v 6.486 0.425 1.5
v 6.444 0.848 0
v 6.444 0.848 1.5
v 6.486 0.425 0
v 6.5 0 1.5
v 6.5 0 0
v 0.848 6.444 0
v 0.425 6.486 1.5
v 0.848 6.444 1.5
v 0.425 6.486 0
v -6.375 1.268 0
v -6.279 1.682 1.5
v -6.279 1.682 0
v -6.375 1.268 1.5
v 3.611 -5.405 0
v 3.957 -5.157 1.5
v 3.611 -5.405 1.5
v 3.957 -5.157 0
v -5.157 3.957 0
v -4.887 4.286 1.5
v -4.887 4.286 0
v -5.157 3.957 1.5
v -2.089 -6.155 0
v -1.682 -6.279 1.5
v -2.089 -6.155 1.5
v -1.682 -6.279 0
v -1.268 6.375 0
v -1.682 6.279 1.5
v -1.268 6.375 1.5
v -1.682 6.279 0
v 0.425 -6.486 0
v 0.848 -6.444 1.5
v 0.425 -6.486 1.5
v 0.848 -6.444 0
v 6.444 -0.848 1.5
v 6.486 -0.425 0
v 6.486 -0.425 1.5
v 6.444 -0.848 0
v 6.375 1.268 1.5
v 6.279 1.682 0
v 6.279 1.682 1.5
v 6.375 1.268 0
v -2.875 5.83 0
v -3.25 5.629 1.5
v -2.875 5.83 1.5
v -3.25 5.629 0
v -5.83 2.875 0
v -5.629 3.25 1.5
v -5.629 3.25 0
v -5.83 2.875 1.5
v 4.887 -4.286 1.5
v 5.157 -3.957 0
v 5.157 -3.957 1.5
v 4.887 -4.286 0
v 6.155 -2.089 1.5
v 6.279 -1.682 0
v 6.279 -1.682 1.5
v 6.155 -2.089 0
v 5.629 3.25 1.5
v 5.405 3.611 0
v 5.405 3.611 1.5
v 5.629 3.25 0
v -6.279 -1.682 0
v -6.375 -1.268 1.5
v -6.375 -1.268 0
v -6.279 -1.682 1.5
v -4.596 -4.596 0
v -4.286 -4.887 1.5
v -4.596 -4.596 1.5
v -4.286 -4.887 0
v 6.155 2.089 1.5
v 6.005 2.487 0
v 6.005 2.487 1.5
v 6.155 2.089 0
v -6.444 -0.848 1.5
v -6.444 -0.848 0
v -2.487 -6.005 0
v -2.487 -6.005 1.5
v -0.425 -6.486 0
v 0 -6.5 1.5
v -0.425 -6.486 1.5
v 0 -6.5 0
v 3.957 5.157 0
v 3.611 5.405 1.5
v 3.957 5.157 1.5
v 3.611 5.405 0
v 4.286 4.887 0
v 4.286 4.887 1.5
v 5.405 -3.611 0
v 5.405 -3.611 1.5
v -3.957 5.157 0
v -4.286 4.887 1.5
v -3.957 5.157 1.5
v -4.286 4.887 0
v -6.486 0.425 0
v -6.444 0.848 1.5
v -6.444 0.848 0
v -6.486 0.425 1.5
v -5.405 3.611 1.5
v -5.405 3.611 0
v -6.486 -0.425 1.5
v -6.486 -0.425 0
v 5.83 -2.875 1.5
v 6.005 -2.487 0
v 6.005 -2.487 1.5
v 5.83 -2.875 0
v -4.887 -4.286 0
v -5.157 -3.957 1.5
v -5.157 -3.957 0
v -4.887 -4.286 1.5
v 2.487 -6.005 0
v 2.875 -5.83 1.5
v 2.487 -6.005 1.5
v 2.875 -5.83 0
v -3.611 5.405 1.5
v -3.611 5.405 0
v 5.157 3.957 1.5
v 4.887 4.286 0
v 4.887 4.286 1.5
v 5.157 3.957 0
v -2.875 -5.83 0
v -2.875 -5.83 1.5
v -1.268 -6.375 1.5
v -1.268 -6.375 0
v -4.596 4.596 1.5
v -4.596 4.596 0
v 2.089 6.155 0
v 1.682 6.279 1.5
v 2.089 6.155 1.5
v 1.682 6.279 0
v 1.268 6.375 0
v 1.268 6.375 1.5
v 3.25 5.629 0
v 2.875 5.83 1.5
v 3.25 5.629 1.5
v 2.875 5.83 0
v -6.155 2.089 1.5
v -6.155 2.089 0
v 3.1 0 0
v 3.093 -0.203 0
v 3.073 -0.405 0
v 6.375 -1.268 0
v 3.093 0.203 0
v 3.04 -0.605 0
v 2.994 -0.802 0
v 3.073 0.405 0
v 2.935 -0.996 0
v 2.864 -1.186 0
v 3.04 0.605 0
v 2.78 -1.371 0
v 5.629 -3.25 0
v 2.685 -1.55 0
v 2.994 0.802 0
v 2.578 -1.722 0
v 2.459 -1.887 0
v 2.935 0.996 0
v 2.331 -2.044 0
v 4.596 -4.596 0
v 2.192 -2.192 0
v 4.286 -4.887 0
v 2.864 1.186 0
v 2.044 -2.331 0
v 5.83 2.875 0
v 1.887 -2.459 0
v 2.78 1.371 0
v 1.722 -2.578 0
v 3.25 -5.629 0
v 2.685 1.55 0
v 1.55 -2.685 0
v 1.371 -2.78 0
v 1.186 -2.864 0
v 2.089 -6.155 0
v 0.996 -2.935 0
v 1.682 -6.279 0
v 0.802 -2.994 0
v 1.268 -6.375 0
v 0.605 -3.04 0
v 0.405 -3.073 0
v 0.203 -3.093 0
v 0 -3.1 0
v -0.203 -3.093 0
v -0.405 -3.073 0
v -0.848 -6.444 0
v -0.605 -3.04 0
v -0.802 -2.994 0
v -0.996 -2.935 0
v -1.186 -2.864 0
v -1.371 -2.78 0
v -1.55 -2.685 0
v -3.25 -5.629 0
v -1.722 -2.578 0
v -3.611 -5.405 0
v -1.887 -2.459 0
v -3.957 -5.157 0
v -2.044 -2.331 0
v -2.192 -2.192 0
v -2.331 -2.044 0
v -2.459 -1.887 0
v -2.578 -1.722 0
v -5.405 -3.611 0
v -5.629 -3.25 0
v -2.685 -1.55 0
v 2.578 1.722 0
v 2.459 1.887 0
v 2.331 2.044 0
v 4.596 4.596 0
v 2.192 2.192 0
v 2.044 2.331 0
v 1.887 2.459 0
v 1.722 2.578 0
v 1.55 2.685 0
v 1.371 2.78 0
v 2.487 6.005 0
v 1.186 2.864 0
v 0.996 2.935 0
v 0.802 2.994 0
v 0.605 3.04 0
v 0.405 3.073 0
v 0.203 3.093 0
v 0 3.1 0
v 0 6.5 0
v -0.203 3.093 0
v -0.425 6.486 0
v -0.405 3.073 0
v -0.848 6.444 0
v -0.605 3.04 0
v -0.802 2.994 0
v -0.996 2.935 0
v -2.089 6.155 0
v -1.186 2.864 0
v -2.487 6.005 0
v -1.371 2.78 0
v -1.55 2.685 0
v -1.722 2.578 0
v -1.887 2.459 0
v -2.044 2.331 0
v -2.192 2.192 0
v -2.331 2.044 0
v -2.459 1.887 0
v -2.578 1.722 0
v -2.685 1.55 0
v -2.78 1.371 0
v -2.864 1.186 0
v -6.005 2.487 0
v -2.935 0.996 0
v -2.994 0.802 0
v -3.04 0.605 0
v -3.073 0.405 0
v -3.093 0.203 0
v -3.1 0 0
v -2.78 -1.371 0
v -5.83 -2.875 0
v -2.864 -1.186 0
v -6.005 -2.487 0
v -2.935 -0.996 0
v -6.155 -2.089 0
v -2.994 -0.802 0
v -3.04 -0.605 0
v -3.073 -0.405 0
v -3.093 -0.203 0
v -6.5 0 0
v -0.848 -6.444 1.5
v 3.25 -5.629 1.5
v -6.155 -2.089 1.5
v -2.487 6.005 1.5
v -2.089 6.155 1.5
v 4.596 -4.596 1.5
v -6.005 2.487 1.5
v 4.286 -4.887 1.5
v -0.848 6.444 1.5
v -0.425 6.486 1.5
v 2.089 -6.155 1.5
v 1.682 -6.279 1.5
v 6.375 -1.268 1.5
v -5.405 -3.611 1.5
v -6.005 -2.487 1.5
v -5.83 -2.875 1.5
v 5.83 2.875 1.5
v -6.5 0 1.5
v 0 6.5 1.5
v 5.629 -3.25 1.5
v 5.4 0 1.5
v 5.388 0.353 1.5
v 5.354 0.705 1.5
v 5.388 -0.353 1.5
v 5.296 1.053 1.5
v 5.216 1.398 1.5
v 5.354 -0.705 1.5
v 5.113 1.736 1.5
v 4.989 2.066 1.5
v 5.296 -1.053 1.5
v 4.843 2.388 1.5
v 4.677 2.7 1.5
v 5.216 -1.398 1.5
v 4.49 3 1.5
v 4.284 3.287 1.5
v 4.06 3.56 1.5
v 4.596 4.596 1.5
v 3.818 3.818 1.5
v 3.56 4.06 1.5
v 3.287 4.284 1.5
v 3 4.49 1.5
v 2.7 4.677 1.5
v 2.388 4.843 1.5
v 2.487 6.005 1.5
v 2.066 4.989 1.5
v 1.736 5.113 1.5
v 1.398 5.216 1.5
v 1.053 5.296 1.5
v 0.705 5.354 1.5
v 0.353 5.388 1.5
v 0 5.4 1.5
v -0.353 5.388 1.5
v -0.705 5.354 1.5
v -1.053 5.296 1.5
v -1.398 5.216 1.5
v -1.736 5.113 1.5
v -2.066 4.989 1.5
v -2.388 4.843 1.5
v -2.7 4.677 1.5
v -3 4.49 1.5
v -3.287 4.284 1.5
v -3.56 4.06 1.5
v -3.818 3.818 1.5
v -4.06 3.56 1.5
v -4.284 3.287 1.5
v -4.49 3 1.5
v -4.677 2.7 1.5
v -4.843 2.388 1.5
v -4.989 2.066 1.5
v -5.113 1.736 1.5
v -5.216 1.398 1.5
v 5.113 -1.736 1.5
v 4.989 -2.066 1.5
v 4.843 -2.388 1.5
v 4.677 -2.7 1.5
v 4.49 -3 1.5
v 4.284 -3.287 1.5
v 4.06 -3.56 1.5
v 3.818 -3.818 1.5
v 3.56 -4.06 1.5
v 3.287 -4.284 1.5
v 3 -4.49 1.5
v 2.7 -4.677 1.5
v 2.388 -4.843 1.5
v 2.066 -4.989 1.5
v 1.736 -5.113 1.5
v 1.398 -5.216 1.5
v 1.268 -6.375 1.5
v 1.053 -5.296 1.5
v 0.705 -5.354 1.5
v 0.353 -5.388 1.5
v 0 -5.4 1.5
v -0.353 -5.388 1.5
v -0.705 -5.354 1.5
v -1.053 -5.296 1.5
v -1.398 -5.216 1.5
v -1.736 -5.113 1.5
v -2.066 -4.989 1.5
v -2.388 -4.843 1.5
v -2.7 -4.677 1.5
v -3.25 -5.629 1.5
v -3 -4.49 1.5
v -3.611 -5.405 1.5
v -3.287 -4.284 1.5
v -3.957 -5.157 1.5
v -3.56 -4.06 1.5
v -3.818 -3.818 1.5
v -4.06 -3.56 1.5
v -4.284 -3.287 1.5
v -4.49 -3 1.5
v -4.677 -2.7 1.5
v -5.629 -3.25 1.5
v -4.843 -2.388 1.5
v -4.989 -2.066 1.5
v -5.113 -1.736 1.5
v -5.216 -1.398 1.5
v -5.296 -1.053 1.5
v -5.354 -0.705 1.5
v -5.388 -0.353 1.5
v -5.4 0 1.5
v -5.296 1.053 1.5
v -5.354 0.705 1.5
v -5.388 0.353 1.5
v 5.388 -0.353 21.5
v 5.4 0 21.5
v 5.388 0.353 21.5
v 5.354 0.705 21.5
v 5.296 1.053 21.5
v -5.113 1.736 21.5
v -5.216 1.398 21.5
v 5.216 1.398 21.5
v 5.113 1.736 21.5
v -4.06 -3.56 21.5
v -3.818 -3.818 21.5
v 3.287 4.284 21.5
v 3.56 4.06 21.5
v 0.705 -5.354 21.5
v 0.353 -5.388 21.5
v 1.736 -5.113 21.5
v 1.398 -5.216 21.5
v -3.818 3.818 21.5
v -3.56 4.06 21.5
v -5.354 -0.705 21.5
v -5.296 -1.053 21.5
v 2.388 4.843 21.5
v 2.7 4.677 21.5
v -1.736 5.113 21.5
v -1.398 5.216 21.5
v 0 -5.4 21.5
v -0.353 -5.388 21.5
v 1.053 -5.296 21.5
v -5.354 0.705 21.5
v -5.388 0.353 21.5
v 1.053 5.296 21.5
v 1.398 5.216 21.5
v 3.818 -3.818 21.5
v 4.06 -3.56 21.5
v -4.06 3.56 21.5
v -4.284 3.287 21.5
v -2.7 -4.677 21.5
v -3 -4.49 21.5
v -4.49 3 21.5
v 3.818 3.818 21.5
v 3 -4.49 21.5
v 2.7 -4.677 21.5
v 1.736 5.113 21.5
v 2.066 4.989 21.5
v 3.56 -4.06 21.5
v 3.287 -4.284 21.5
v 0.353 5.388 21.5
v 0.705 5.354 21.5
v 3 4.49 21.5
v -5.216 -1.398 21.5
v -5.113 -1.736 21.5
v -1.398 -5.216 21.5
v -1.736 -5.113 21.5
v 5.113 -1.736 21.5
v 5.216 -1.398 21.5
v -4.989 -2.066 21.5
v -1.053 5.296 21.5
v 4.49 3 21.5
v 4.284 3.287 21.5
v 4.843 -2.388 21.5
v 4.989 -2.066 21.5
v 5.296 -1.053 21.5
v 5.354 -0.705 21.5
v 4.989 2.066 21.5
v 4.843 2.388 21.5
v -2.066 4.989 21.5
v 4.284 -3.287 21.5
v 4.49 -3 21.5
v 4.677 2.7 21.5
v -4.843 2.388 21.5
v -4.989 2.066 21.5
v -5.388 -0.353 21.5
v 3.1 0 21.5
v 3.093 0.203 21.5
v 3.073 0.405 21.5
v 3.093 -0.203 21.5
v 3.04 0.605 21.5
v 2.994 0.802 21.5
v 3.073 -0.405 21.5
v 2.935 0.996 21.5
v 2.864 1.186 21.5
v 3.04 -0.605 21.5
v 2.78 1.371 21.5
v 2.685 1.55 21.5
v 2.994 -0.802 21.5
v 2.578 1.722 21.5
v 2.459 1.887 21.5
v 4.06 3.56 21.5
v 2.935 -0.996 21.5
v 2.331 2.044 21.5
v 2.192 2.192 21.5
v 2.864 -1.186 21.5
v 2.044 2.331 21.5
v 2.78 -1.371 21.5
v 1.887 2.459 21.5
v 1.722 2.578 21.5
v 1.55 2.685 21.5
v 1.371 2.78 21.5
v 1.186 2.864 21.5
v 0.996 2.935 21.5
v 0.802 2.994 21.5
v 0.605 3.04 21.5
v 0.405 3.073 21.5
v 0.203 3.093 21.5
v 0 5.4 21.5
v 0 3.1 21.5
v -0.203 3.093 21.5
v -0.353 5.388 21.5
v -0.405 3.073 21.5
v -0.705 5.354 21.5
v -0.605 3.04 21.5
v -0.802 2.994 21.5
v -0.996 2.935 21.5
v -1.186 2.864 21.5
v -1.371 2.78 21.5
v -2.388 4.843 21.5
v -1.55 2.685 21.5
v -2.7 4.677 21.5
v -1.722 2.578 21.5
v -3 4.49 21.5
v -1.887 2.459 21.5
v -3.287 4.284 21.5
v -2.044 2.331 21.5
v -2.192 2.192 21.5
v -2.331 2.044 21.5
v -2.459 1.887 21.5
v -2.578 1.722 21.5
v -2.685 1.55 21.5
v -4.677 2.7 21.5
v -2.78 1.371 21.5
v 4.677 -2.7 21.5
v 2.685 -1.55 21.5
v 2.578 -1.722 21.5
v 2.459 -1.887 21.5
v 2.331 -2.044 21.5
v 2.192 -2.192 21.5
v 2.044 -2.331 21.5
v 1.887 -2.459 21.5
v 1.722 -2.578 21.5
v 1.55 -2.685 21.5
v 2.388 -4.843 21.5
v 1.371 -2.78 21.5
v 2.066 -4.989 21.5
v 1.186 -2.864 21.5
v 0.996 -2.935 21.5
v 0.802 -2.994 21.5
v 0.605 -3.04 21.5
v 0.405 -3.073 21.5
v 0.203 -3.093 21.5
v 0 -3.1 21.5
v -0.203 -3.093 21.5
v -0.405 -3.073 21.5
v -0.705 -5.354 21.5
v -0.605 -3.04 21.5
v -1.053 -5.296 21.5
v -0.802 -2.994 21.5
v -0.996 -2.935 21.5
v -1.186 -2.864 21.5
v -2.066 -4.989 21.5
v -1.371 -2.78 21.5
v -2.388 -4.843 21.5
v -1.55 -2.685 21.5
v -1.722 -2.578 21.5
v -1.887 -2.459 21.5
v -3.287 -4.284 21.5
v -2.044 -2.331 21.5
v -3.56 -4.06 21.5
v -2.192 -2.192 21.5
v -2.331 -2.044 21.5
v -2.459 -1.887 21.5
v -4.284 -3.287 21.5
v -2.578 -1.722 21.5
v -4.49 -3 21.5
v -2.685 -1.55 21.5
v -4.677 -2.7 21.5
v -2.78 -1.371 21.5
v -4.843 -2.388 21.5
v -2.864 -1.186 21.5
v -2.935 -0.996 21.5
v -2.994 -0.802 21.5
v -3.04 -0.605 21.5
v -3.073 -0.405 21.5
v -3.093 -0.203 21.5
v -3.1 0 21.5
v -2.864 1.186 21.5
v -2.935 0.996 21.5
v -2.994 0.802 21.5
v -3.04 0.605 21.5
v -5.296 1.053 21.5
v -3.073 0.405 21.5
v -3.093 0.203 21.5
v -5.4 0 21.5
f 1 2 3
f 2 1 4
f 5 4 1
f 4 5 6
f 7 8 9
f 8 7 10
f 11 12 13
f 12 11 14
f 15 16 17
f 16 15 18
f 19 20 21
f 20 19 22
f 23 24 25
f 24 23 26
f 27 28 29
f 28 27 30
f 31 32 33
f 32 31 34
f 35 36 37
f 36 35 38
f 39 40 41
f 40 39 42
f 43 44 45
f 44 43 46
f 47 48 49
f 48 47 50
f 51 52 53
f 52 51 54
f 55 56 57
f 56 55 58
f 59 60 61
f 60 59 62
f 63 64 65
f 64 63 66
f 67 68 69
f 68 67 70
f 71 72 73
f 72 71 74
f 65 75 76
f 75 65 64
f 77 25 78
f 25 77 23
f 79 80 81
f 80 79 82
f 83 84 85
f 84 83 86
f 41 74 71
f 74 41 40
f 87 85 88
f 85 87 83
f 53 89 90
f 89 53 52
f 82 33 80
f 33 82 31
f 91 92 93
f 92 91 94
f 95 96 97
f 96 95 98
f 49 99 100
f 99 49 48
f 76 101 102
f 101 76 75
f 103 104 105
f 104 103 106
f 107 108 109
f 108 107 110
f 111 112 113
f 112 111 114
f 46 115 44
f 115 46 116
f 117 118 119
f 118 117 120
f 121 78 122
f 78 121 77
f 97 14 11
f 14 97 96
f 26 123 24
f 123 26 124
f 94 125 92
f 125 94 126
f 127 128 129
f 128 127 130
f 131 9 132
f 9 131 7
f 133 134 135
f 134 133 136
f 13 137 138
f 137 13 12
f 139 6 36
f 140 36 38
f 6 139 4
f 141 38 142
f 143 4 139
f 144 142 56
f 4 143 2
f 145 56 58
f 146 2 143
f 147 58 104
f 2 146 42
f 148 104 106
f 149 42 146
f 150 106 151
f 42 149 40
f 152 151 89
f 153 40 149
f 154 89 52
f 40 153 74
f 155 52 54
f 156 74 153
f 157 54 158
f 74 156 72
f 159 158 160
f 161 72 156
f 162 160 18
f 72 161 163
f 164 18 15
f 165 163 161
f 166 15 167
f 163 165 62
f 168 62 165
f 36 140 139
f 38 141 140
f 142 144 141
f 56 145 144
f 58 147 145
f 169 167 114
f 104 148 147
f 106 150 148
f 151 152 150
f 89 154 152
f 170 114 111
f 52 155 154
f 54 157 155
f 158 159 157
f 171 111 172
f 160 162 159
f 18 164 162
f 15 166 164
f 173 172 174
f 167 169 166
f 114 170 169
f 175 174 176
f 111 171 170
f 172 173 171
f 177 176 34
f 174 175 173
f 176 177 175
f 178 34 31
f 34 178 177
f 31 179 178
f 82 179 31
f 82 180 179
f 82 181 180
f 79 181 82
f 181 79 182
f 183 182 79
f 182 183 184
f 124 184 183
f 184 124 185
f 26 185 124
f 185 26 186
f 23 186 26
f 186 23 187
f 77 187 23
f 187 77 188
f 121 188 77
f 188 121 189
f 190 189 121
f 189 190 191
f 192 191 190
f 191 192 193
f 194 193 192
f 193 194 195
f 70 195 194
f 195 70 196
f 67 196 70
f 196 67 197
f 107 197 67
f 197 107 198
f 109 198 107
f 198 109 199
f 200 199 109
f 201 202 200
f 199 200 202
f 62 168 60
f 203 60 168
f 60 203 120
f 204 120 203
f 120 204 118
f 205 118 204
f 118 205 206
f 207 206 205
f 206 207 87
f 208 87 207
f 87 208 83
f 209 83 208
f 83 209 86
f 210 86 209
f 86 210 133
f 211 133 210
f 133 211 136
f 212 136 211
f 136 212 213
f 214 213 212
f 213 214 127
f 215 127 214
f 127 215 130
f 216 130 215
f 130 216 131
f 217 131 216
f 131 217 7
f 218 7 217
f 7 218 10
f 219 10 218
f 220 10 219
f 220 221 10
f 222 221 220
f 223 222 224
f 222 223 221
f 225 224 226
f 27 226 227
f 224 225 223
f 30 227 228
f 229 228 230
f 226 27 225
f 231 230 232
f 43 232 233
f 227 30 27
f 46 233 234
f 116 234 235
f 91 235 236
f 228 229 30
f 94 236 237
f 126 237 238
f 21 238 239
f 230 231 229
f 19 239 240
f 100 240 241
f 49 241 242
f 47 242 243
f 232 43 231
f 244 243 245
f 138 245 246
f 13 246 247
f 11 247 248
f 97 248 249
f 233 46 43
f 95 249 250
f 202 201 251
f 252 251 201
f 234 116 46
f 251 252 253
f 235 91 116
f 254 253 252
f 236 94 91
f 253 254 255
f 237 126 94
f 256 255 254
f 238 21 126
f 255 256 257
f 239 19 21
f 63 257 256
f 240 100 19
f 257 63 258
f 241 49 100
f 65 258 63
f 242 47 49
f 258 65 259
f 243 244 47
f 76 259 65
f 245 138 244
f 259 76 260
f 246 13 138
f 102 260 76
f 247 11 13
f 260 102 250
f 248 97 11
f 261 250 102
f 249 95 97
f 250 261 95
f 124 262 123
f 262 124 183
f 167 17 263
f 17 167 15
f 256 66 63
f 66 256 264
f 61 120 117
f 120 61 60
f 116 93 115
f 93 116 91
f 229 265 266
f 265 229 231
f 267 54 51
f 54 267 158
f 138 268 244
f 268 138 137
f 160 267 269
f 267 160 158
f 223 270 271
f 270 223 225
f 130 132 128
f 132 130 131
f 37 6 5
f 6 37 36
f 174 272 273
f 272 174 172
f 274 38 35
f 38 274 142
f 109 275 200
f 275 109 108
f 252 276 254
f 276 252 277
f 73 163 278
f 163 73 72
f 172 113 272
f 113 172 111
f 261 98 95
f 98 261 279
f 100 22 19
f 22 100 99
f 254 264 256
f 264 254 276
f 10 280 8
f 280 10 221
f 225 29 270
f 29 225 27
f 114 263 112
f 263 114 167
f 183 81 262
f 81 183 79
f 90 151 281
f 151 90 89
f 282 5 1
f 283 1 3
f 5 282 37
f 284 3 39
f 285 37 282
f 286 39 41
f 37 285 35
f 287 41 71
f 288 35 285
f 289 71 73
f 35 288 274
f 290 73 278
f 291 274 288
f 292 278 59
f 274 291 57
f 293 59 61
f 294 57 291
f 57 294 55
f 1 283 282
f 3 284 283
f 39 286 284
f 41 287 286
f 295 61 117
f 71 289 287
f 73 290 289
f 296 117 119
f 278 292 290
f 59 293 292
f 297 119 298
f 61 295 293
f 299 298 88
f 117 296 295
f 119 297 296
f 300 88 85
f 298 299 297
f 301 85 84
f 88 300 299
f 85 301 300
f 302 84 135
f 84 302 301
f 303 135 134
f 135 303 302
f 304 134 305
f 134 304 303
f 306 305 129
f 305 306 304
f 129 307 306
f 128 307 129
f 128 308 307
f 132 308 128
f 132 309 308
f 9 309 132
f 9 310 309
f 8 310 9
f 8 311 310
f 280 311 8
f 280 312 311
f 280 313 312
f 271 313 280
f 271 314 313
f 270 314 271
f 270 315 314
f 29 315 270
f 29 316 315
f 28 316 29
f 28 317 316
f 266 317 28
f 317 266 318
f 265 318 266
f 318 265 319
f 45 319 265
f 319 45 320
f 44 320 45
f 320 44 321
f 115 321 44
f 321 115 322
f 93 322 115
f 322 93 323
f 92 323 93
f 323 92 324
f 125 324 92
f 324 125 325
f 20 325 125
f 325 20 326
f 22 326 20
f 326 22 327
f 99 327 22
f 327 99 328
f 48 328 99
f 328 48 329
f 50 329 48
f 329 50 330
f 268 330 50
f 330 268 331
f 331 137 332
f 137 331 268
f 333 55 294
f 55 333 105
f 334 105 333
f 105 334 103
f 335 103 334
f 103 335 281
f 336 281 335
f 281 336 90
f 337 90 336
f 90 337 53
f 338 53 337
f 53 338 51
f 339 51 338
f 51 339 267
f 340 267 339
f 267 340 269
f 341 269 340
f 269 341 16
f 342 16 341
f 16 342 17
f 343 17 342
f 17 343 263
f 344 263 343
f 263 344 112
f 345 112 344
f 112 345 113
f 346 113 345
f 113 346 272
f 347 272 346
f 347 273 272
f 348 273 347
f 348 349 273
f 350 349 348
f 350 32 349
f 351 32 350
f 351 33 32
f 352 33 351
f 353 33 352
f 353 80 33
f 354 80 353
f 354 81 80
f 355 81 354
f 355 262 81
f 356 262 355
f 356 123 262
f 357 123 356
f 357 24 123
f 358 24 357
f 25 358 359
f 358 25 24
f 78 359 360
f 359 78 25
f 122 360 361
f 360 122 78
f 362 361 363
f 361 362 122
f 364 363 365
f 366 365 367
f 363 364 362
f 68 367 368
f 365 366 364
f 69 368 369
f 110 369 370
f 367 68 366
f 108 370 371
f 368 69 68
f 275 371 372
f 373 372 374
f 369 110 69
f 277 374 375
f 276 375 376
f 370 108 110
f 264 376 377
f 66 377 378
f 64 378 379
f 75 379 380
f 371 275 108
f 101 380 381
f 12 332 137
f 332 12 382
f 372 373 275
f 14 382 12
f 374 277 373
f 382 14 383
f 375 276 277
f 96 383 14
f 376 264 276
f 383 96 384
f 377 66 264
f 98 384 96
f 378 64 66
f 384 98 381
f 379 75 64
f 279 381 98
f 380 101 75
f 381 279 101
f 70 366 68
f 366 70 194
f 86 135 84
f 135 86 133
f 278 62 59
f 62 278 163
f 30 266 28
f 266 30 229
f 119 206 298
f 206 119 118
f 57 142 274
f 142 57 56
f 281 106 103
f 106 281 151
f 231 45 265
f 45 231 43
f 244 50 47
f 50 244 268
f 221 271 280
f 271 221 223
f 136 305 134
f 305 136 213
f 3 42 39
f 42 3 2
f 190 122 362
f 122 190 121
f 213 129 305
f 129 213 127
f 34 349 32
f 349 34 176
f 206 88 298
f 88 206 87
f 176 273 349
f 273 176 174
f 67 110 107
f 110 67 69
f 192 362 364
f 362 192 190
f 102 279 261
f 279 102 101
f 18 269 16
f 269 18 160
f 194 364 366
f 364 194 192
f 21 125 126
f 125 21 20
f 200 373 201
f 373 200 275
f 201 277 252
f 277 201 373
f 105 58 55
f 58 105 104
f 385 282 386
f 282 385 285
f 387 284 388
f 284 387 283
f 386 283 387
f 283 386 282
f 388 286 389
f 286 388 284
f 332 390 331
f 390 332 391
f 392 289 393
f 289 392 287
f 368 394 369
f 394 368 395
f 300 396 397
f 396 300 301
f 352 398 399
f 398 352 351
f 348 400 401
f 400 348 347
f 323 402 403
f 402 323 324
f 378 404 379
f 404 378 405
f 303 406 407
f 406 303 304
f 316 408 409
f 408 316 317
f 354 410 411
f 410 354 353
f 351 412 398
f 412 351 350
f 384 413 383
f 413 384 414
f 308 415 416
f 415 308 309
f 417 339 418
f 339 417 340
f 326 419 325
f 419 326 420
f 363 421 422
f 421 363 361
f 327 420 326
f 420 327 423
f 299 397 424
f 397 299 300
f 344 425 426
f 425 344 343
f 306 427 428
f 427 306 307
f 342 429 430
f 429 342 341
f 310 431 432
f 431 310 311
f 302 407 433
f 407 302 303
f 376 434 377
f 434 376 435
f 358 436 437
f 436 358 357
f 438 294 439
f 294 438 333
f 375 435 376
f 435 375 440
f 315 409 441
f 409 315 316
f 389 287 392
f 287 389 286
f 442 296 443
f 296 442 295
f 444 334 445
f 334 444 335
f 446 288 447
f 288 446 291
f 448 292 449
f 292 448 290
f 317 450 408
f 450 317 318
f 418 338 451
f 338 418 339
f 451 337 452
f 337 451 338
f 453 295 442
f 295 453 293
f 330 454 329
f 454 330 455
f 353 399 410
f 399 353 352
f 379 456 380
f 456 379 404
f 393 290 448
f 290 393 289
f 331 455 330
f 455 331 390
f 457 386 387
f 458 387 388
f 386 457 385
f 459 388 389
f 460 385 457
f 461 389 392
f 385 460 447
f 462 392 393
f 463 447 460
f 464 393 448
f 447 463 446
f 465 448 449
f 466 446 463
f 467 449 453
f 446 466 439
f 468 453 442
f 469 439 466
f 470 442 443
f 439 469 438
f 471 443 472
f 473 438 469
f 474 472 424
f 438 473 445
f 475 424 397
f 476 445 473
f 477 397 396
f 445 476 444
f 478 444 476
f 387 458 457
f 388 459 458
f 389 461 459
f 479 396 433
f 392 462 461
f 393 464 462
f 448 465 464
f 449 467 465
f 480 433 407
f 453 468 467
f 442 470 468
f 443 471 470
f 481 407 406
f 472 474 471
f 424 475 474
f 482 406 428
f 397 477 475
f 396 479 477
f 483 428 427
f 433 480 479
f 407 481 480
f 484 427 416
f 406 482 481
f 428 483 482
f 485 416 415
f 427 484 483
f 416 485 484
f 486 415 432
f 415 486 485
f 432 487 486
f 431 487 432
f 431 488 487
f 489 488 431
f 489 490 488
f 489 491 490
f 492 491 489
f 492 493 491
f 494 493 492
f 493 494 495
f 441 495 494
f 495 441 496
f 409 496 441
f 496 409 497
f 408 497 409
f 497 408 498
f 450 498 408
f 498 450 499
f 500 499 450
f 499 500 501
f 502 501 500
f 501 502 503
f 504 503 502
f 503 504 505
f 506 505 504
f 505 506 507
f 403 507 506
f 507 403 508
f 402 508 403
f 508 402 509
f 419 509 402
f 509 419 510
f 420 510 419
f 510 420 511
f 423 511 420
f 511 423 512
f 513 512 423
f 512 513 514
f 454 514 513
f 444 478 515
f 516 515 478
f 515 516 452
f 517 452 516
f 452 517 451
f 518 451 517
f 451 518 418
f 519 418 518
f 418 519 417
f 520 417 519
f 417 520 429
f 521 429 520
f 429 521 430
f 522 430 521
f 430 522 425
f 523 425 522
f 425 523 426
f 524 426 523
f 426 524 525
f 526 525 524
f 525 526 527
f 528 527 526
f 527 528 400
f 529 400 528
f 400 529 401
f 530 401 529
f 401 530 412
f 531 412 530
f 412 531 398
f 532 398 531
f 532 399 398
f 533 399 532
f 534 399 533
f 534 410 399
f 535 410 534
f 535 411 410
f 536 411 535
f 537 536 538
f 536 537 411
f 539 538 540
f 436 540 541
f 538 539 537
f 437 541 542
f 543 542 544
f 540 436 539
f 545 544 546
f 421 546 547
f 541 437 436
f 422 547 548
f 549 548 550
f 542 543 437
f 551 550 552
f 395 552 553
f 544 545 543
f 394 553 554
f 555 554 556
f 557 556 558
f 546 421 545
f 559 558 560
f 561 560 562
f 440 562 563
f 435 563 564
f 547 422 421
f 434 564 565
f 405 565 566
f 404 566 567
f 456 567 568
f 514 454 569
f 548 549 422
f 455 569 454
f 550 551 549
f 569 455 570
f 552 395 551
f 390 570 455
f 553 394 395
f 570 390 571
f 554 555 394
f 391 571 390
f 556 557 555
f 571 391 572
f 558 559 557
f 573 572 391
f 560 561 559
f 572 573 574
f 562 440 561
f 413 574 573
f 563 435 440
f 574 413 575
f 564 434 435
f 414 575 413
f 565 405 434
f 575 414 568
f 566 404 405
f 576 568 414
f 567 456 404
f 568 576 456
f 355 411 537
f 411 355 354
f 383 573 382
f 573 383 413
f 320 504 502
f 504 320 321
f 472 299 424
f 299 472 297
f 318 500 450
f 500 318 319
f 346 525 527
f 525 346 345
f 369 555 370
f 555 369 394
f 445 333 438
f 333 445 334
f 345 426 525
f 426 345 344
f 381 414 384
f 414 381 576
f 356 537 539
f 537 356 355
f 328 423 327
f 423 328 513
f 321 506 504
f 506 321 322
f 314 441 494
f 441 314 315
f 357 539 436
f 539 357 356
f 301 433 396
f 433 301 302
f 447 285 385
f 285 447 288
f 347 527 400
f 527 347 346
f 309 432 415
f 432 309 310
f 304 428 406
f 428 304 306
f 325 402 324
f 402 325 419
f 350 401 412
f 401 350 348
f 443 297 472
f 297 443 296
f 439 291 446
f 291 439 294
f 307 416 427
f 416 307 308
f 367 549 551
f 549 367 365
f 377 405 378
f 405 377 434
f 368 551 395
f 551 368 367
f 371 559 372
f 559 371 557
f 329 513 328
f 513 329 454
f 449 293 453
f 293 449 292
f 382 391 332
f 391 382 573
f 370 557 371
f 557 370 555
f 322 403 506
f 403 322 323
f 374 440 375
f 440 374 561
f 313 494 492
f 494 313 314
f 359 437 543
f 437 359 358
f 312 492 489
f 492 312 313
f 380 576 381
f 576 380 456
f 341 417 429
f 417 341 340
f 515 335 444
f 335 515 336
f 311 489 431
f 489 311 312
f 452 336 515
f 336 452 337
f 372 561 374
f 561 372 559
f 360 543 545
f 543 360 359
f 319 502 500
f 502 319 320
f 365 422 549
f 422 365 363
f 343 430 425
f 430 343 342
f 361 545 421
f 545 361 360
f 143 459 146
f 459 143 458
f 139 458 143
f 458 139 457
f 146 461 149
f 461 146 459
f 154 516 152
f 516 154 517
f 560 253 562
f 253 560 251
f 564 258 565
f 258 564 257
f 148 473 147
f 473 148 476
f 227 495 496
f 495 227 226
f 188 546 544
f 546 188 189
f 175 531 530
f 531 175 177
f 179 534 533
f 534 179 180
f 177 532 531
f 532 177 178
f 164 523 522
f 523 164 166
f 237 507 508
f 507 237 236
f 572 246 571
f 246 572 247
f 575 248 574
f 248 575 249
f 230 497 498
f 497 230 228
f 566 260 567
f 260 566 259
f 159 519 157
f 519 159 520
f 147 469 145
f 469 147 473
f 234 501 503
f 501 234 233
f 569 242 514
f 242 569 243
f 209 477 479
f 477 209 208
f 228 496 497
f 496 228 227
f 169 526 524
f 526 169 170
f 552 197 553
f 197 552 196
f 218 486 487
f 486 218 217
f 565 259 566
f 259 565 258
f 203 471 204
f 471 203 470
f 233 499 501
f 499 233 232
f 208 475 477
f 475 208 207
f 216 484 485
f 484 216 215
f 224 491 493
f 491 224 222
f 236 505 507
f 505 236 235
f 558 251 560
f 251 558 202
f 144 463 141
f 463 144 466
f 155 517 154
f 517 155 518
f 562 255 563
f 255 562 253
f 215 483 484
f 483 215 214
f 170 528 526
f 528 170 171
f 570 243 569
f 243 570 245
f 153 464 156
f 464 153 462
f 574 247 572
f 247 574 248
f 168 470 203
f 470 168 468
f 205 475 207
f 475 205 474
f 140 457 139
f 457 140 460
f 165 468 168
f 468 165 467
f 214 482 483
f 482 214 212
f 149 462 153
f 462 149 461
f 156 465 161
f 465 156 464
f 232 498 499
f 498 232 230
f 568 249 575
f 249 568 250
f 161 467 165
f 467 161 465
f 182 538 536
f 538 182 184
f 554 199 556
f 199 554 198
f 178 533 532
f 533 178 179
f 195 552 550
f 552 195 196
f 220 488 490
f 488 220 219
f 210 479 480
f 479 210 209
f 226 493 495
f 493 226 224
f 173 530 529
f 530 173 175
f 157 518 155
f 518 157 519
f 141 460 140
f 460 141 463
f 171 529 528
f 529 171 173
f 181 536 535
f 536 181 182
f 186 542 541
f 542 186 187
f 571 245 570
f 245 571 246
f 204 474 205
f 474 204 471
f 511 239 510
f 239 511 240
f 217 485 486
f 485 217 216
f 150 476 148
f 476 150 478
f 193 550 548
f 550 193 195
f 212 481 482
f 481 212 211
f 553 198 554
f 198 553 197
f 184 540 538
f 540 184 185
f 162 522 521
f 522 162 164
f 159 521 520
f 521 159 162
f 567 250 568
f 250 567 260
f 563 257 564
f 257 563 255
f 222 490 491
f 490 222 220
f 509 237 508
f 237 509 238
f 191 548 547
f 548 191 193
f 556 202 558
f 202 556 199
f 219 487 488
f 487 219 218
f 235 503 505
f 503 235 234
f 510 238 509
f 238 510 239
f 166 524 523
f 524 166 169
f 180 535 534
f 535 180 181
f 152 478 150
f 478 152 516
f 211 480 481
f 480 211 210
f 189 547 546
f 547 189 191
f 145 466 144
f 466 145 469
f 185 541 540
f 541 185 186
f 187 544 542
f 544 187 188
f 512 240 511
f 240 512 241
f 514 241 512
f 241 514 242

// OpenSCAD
// Adapter sleeve: lets a 0.2 mL PCR tube sit in a rack hole made for 1.5 mL tubes
// Print orientation: upside down, collar on the bed (z = 0), sleeve rising to z = 21.5

$fn = 96;

// ---- Dimensions (mm) ----
collar_d      = 13;    // collar outer diameter
collar_h      = 1.5;   // collar thickness (z = 0 to 1.5)
sleeve_od     = 10.8;  // sleeve body outer diameter
total_h       = 21.5;  // overall height (top of sleeve)
bore_d        = 6.2;   // straight through-bore diameter
eps           = 0.5;   // cutter overshoot past faces

difference() {
    union() {
        // Collar lying on the bed
        cylinder(d = collar_d, h = collar_h);
        // Sleeve body rising from the collar (slight overlap for a clean union)
        translate([0, 0, collar_h - 0.01])
            cylinder(d = sleeve_od, h = total_h - collar_h + 0.01);
    }
    // Straight bore through the full height, open at both ends
    translate([0, 0, -eps])
        cylinder(d = bore_d, h = total_h + 2 * eps);
}
